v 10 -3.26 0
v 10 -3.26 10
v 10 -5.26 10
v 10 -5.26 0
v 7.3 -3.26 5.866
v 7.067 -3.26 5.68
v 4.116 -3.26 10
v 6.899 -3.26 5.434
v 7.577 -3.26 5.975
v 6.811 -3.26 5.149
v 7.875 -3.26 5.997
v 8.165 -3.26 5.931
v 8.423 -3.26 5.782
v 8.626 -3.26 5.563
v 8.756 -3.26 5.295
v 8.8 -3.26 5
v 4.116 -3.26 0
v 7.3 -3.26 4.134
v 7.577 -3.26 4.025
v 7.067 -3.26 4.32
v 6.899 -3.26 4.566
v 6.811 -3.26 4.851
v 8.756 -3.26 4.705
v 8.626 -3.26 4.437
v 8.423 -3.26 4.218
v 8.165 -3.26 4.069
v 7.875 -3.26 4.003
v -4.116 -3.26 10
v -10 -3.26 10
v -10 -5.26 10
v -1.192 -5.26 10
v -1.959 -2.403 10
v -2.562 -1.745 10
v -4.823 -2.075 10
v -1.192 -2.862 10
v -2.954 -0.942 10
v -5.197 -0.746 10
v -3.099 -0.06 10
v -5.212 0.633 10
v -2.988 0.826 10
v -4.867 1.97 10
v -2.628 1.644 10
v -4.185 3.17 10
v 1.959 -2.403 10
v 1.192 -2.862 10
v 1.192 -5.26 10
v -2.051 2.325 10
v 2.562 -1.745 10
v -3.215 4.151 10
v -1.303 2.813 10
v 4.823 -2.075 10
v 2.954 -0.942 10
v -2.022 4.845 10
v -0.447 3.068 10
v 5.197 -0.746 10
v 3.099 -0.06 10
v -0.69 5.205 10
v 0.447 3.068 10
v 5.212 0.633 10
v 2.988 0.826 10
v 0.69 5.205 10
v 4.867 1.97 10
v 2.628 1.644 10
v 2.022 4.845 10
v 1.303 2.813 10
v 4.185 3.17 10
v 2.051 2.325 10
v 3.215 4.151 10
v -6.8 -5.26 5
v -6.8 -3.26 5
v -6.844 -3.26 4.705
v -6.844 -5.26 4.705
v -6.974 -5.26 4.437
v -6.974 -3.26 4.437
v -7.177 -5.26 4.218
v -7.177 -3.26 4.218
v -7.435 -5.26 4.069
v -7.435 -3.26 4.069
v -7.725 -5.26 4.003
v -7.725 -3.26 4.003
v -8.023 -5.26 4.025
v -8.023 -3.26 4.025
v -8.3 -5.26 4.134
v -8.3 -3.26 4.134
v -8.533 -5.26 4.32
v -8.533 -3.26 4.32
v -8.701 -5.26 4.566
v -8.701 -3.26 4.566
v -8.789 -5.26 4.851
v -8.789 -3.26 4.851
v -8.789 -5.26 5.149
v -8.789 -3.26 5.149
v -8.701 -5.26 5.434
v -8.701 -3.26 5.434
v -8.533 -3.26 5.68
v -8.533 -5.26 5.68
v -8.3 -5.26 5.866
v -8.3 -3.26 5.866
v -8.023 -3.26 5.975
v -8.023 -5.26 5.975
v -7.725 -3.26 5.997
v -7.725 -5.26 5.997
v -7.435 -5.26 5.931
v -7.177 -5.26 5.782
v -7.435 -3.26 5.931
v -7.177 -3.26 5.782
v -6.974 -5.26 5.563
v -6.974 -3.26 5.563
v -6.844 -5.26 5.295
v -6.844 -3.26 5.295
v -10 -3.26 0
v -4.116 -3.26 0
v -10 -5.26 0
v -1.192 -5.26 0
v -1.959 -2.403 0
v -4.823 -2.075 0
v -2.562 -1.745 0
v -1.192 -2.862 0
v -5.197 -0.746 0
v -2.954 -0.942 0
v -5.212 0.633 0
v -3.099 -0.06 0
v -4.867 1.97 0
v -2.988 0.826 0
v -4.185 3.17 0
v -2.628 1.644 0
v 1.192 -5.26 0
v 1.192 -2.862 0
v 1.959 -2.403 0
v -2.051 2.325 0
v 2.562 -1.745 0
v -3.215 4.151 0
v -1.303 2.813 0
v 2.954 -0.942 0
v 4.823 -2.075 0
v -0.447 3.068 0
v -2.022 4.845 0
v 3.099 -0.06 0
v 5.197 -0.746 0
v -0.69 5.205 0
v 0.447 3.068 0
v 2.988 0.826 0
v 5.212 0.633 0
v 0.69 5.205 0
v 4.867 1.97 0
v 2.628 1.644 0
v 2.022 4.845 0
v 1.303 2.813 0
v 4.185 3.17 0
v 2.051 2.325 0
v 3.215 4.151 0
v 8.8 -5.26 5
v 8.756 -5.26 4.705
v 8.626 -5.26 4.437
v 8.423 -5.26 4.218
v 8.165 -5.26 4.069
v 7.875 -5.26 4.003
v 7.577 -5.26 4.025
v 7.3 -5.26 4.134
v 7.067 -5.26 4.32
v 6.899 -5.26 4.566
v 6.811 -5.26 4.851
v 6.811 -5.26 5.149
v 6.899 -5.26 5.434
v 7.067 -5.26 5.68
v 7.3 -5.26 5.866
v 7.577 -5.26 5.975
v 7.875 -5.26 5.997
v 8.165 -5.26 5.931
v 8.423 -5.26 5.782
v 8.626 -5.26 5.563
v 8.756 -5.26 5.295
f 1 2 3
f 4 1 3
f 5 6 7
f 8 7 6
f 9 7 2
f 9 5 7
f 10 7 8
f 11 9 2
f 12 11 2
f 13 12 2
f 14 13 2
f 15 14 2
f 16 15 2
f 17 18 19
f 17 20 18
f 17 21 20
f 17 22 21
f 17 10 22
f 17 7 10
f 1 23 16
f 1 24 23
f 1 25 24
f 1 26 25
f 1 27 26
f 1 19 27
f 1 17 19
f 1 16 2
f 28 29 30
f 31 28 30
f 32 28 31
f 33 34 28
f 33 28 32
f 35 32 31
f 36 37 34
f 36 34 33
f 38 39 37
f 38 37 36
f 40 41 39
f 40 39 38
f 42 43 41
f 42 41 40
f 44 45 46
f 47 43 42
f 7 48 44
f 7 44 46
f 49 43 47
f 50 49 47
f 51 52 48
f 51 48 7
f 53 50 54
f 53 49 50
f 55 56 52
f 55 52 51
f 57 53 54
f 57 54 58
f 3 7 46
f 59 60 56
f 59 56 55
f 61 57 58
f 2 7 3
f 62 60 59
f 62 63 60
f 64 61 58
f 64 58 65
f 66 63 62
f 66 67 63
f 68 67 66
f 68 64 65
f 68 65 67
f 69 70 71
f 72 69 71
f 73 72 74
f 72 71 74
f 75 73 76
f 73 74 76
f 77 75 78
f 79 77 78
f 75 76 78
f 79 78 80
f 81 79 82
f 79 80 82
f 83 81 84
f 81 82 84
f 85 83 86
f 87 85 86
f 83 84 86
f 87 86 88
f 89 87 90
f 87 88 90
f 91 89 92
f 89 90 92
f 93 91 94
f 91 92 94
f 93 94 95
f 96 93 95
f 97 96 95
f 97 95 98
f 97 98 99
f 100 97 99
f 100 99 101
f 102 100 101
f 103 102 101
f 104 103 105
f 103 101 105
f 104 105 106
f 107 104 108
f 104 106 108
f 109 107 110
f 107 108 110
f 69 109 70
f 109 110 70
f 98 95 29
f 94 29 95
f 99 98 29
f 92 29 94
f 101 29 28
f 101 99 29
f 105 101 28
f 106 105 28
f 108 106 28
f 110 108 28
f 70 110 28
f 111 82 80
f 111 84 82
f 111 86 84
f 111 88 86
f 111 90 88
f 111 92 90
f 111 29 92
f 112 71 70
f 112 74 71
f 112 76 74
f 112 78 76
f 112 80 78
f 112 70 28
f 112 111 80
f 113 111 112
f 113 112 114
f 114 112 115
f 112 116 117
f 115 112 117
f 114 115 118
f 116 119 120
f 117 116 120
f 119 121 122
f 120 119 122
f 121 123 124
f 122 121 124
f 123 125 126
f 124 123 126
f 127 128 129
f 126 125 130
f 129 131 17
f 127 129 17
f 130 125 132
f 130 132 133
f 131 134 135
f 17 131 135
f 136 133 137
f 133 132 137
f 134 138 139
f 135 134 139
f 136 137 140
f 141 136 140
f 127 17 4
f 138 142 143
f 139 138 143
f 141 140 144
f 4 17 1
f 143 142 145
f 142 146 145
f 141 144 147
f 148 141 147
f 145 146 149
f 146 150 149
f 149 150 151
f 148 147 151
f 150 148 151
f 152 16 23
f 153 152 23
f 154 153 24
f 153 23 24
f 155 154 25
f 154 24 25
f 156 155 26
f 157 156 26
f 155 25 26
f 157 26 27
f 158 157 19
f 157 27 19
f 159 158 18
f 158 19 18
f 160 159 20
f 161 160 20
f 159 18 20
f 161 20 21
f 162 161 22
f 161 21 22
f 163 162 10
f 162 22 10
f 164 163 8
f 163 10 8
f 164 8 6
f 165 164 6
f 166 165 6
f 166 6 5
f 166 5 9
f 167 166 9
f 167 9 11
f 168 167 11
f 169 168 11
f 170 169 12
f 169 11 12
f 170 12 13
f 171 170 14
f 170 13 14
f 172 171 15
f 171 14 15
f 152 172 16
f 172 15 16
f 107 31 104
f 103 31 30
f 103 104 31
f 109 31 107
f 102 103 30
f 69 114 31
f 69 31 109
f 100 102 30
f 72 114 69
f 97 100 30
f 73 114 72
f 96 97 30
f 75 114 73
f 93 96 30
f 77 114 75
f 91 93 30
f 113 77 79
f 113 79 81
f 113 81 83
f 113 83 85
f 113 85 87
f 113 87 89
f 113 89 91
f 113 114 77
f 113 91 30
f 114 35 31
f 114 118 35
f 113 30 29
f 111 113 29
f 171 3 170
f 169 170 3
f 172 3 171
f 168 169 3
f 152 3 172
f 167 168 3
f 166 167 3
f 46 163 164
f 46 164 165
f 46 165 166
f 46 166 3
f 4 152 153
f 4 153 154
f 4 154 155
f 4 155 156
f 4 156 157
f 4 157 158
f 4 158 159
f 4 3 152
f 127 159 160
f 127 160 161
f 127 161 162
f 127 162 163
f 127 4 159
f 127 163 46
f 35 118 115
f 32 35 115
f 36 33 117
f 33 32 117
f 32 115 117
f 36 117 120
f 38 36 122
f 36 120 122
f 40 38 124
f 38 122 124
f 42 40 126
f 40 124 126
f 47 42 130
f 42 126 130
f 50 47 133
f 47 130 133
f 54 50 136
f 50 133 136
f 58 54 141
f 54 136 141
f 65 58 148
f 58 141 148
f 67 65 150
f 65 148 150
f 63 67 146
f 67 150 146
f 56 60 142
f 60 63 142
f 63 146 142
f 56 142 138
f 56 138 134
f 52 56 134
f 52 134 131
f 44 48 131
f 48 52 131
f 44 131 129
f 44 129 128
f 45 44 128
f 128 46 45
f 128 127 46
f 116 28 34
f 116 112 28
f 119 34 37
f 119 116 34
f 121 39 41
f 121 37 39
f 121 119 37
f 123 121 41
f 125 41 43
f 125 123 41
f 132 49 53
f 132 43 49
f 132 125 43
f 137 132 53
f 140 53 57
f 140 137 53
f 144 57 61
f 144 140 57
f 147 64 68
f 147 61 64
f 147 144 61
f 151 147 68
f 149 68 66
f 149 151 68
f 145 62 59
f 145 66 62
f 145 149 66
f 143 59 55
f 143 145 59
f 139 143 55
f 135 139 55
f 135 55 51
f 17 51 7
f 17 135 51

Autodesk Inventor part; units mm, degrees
ref_plane "YZ Plane" through (0, 0, 0) normal (1, 0, 0) x (0, 1, 0)
ref_plane "XZ Plane" through (0, 0, 0) normal (0, 1, 0) x (-1, 0, 0)
ref_plane "XY Plane" through (0, 0, 0) normal (0, 0, 1) x (1, 0, 0)
sketch "スケッチ1" plane through (0, 0, 0) normal (0, 0, 1) x (1, 0, 0)
  arc A0 (1.1923, -2.8615) -> (-1.1923, -2.8615) centre (0, 0) ccw
  arc A1 (4.1155, -3.2597) -> (-4.1155, -3.2597) centre (0, 0) ccw
  line L0 (-10, -3.2597) -> (-4.1155, -3.2597)
  line L1 (10, -3.2597) -> (10, -5.2597)
  line L2 (10, -5.2597) -> (1.1923, -5.2597)
  line L3 (-10, -5.2597) -> (-10, -3.2597)
  line L4 (4.1155, -3.2597) -> (10, -3.2597)
  line L5 (1.1923, -5.2597) -> (1.1923, -2.8615)
  line L6 (-1.1923, -2.8615) -> (-1.1923, -5.2597)
  line L7 (-1.1923, -5.2597) -> (-10, -5.2597)
  dimension "d0" = 6.2
  dimension "d1" = 10.5
  dimension "d2" = 20
  dimension "d5" = 2
extrude "押し出し1" add sketch "スケッチ1" along normal blind 10
sketch "スケッチ2" plane through (-10, -3.2597, 0) normal (0, 1, 0) x (1, 0, 0)
  circle A0 centre (2.2, -5) radius 1
  circle A1 centre (17.8, -5) radius 1
  line L0 (0, 0) -> (0, -10) projected
  point P0 (10, 0)
  point P1 (0, -5)
  dimension "d8" = 2
  dimension "d9" = 2
  dimension "d10" = 15.6
  dimension "d11" = 2.2
extrude "押し出し2" cut sketch "スケッチ2" against normal blind 10
properties part number "motor_cover_part2"
